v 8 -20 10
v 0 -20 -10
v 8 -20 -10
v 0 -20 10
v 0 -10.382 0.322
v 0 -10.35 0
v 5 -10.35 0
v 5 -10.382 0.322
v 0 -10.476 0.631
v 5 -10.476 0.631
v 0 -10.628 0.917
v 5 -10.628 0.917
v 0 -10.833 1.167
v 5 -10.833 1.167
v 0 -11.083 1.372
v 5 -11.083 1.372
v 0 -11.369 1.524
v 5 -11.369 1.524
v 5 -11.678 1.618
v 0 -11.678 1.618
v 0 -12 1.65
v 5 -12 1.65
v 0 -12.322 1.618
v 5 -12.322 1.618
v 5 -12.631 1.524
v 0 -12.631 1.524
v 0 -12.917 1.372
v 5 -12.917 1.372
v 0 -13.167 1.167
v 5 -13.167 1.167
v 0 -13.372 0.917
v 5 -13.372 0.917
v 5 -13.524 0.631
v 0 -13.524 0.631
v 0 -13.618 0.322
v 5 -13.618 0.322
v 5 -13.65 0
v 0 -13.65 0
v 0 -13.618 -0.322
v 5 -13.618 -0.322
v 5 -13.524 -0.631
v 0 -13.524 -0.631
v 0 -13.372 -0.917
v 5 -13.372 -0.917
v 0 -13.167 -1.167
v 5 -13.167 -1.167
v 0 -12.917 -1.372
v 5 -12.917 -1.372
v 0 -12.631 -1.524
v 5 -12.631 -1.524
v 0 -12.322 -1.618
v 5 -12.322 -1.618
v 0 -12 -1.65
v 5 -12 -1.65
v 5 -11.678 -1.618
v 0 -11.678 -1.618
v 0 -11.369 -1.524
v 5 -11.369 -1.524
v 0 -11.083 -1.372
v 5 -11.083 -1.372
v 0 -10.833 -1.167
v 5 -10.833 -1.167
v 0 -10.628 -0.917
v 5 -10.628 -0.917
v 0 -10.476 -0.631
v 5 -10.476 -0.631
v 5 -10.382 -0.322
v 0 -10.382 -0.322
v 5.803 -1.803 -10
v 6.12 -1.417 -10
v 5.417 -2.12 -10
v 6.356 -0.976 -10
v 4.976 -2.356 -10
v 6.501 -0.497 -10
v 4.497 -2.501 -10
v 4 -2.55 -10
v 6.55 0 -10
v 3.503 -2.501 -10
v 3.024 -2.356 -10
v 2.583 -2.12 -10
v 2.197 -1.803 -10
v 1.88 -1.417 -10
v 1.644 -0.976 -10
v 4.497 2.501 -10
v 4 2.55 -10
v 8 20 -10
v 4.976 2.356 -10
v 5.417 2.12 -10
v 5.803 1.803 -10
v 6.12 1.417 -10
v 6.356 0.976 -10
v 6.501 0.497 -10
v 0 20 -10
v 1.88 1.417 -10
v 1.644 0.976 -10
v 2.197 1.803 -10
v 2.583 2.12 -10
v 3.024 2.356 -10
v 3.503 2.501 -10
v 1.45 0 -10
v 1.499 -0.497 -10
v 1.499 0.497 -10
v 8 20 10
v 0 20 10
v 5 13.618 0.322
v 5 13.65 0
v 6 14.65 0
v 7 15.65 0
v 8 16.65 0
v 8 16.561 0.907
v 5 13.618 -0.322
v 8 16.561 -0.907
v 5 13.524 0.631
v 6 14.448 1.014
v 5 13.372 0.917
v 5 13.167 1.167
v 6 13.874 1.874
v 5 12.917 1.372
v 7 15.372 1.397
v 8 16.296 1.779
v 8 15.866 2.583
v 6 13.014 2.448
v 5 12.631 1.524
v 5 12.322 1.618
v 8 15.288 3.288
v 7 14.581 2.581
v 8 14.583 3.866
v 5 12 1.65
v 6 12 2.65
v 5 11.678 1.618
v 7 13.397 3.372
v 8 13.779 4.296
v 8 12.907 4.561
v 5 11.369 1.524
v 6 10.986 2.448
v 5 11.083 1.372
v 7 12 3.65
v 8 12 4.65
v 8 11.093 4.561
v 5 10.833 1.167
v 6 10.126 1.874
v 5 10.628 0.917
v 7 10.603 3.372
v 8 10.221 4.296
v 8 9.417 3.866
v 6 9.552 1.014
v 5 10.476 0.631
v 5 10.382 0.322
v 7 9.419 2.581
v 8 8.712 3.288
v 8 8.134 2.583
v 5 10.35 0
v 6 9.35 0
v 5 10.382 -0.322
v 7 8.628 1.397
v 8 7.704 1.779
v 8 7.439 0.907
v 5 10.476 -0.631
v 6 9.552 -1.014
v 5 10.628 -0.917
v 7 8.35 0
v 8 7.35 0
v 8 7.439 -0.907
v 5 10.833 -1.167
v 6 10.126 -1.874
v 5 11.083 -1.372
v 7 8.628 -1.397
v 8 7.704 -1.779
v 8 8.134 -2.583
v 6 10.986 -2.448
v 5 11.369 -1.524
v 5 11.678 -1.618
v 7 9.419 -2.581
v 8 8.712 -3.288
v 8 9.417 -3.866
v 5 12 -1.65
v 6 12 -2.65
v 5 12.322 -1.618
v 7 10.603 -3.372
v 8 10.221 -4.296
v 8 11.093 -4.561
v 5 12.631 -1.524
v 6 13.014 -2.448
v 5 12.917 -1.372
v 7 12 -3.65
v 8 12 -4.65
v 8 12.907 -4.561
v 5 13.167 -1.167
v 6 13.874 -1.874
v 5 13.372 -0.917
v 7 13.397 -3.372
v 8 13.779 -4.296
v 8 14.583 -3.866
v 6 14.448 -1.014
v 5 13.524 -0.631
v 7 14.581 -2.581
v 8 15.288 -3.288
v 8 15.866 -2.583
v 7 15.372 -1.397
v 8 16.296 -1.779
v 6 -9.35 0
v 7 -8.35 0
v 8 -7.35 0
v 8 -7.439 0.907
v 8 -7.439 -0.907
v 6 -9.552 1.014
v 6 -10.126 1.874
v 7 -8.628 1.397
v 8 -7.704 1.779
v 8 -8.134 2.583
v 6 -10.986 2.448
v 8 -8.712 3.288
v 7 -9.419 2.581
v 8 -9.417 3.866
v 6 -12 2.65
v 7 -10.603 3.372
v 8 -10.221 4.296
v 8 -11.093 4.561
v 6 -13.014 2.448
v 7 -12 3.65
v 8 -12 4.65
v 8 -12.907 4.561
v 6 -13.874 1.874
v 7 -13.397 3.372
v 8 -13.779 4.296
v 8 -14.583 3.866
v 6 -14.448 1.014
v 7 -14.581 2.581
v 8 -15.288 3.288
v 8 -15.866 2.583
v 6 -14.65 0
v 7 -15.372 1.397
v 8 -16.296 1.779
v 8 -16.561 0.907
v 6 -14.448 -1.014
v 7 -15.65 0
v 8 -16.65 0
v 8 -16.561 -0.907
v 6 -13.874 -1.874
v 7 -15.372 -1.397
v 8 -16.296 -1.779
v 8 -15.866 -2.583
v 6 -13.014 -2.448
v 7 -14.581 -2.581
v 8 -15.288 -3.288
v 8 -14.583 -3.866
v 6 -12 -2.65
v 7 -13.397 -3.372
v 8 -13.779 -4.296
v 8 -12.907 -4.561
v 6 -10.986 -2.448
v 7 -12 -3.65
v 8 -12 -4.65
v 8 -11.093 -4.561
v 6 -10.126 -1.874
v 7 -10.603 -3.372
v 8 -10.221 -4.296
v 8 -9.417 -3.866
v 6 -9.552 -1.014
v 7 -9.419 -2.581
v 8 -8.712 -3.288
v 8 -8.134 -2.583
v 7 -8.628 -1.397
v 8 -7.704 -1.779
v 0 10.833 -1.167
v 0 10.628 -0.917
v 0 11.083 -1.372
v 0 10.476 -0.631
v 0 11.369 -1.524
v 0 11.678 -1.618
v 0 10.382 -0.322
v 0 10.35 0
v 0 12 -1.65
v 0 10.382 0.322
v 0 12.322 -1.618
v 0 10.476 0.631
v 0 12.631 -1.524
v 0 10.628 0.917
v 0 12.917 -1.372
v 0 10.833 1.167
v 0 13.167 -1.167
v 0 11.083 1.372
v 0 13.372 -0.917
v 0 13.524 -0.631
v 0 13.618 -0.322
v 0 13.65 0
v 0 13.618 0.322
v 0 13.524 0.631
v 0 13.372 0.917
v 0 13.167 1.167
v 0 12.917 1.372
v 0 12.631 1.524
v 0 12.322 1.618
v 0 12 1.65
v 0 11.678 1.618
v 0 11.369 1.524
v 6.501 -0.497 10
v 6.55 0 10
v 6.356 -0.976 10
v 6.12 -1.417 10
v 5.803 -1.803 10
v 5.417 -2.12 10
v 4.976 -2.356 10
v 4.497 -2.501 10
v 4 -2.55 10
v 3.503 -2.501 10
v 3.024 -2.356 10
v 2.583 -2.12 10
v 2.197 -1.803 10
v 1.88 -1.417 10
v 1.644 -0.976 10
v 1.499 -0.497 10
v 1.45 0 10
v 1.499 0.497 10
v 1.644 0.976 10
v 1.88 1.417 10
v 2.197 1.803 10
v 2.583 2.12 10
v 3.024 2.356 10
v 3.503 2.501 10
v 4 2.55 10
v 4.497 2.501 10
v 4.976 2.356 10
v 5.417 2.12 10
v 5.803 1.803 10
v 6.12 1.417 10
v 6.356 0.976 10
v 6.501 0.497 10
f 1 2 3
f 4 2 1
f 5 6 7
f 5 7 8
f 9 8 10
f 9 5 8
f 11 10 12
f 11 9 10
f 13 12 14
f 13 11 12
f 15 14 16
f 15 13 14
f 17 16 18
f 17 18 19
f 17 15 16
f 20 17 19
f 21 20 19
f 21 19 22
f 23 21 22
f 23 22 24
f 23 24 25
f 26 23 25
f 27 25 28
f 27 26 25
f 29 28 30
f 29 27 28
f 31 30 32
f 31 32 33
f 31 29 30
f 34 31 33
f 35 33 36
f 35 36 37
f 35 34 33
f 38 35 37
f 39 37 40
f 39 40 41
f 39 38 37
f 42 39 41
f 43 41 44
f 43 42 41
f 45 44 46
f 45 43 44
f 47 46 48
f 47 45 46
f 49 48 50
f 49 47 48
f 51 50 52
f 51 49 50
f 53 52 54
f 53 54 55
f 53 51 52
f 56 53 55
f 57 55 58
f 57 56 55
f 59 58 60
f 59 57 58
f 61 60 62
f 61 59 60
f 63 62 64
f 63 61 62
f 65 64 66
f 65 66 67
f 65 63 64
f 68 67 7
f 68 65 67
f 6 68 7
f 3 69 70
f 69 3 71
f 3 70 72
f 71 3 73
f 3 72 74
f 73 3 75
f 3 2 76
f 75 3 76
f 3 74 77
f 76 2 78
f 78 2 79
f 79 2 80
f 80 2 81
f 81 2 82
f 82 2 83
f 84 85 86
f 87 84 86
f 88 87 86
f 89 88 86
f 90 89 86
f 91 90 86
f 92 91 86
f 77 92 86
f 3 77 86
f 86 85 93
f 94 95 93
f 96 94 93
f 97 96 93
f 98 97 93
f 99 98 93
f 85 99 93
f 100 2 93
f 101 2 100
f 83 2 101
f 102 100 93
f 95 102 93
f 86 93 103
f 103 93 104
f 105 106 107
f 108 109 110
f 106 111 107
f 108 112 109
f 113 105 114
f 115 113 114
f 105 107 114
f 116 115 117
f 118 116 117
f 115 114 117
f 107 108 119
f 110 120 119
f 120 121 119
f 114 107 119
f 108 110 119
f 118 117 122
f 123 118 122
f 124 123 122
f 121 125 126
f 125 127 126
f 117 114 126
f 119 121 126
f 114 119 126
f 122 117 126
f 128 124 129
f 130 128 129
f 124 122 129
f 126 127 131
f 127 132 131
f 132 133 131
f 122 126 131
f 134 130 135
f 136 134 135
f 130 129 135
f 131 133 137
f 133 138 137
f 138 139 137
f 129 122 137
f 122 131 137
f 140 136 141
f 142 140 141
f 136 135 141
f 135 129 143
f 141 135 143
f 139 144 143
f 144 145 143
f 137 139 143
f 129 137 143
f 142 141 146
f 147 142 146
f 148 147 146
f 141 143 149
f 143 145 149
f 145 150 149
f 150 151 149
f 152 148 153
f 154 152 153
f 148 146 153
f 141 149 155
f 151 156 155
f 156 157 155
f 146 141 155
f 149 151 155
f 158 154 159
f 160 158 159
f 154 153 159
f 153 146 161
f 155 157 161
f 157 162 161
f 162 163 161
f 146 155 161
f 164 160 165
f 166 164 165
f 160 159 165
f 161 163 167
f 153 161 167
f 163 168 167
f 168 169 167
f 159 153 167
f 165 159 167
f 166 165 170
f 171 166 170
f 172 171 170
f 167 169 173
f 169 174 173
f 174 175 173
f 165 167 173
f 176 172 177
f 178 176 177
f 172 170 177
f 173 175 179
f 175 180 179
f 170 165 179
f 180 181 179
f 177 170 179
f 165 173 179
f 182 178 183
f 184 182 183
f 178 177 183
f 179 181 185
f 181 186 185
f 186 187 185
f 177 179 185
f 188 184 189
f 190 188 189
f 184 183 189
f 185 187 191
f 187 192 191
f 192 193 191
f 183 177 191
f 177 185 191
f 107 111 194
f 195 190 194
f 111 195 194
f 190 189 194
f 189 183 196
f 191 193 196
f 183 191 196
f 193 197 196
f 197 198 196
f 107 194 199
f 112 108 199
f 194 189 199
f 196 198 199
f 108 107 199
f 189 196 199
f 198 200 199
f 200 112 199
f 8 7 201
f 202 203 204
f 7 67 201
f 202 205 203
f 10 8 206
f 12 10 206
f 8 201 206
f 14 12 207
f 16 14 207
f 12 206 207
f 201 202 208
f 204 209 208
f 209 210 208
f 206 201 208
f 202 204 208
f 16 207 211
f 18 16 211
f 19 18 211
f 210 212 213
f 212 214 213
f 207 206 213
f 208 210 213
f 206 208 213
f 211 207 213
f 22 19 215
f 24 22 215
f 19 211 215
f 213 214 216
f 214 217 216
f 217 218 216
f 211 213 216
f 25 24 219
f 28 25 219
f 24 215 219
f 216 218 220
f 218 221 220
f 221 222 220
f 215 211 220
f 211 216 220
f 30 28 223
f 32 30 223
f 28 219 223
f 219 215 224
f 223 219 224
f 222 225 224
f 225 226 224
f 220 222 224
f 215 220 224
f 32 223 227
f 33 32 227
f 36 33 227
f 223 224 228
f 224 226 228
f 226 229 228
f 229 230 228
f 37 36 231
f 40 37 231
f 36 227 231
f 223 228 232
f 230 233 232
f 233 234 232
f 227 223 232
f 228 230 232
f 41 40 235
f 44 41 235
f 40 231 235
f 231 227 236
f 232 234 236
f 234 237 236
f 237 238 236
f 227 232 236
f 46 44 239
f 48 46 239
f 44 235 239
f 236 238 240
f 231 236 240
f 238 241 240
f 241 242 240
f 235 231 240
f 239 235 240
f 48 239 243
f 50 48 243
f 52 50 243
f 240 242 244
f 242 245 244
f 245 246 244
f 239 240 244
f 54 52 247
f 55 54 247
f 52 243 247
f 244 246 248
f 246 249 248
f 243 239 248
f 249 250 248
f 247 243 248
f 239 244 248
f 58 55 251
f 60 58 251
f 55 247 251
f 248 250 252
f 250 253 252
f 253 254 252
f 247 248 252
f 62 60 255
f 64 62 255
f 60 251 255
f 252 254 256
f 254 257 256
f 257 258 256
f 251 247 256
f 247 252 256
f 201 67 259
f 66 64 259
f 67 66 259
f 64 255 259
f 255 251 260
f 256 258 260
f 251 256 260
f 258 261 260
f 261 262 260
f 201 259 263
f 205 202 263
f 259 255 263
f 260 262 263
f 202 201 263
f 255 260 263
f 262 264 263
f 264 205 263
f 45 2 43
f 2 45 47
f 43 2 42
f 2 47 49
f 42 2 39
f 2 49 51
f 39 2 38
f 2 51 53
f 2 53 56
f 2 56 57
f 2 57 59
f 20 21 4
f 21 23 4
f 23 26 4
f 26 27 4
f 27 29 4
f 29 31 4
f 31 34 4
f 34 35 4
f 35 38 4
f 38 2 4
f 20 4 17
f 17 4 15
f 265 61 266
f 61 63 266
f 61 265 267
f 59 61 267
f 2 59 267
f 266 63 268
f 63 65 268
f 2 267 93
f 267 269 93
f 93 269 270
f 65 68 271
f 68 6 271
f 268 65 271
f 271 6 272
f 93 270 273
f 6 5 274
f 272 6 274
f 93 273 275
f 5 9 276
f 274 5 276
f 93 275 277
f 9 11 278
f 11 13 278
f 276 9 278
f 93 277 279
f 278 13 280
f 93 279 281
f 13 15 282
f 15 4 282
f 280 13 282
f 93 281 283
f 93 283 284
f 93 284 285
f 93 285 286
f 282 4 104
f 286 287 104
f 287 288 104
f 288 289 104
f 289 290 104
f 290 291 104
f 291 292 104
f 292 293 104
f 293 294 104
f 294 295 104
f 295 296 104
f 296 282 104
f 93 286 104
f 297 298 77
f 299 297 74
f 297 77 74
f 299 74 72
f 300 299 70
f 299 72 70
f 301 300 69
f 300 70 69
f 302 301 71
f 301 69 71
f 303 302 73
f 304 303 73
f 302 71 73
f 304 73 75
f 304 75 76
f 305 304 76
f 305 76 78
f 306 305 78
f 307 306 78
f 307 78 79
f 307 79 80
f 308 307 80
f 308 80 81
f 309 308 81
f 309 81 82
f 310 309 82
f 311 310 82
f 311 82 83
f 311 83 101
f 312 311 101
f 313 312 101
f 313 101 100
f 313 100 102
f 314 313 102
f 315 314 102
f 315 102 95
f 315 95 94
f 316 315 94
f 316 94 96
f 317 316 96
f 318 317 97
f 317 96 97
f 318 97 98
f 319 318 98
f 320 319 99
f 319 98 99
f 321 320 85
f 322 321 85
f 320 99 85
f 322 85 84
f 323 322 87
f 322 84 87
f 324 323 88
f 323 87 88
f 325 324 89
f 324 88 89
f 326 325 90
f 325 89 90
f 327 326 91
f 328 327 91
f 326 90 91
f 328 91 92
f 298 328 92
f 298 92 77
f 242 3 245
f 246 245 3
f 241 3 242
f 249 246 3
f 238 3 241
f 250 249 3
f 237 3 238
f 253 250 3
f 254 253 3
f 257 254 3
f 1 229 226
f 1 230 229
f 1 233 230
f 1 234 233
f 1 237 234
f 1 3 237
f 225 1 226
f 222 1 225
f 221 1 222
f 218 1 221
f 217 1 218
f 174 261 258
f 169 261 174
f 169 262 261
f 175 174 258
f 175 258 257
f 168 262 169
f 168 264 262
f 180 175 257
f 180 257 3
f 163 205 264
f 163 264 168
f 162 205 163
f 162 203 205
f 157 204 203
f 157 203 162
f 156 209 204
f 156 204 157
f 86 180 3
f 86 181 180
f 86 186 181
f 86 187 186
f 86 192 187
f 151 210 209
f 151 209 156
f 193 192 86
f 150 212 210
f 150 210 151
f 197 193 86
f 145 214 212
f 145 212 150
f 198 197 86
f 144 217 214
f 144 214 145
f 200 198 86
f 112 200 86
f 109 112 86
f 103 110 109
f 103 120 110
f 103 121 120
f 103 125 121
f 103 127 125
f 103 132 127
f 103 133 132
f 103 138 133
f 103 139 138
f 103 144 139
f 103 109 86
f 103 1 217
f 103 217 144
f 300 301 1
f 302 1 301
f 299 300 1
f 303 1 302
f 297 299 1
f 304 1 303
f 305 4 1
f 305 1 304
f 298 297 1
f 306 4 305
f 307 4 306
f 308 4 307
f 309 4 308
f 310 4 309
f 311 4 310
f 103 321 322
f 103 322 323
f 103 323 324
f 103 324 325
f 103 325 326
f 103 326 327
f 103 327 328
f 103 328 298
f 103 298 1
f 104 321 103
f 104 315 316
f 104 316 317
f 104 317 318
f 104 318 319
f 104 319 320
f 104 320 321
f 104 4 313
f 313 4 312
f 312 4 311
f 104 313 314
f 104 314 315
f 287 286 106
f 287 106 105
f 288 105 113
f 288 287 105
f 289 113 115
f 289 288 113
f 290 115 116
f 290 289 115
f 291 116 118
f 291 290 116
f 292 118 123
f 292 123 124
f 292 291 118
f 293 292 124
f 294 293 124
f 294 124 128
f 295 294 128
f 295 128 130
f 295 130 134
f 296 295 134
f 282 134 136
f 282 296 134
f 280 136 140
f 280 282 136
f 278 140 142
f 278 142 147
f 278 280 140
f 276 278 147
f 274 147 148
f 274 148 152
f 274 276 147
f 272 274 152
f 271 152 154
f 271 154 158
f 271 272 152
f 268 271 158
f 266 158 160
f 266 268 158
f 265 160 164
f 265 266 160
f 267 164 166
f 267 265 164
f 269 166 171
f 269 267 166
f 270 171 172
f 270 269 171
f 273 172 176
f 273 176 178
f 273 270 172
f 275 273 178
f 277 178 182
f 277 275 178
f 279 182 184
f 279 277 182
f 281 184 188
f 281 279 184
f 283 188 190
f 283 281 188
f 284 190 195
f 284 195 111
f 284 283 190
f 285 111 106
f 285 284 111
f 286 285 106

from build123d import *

# Parameters (mm, degrees)
F0_W     = 40
F0_H     = 20
F0_R     = 1.65
F1_DEPTH = 8
F2_SIZE  = 3
F3_R     = 2.55
F4_DEPTH = 20.001


with BuildPart() as f1:
    # F0 (on Right) → F1 (new body)
    with BuildSketch(Plane.YZ):
        Rectangle(F0_W, F0_H)
        with Locations((-12, 0)):
            Circle(F0_R, mode=Mode.SUBTRACT)
        with Locations((12, 0)):
            Circle(F0_R, mode=Mode.SUBTRACT)
    extrude(amount=F1_DEPTH)

    # F2
    f2_edges = [f1.edges().sort_by_distance(p)[0] for p in [
        (8, -13.65, 0),
        (8, 10.35, 0),
    ]]
    chamfer(f2_edges, length=F2_SIZE)

    # F3 (on face) → F4 (cut, through all)
    with BuildSketch(Plane(origin=(0, 0, -10), x_dir=(1, 0, 0), z_dir=(0, 0, -1))):
        with Locations((4, 0)):
            Circle(F3_R)
    extrude(amount=-F4_DEPTH, mode=Mode.SUBTRACT)


solid = f1.part
